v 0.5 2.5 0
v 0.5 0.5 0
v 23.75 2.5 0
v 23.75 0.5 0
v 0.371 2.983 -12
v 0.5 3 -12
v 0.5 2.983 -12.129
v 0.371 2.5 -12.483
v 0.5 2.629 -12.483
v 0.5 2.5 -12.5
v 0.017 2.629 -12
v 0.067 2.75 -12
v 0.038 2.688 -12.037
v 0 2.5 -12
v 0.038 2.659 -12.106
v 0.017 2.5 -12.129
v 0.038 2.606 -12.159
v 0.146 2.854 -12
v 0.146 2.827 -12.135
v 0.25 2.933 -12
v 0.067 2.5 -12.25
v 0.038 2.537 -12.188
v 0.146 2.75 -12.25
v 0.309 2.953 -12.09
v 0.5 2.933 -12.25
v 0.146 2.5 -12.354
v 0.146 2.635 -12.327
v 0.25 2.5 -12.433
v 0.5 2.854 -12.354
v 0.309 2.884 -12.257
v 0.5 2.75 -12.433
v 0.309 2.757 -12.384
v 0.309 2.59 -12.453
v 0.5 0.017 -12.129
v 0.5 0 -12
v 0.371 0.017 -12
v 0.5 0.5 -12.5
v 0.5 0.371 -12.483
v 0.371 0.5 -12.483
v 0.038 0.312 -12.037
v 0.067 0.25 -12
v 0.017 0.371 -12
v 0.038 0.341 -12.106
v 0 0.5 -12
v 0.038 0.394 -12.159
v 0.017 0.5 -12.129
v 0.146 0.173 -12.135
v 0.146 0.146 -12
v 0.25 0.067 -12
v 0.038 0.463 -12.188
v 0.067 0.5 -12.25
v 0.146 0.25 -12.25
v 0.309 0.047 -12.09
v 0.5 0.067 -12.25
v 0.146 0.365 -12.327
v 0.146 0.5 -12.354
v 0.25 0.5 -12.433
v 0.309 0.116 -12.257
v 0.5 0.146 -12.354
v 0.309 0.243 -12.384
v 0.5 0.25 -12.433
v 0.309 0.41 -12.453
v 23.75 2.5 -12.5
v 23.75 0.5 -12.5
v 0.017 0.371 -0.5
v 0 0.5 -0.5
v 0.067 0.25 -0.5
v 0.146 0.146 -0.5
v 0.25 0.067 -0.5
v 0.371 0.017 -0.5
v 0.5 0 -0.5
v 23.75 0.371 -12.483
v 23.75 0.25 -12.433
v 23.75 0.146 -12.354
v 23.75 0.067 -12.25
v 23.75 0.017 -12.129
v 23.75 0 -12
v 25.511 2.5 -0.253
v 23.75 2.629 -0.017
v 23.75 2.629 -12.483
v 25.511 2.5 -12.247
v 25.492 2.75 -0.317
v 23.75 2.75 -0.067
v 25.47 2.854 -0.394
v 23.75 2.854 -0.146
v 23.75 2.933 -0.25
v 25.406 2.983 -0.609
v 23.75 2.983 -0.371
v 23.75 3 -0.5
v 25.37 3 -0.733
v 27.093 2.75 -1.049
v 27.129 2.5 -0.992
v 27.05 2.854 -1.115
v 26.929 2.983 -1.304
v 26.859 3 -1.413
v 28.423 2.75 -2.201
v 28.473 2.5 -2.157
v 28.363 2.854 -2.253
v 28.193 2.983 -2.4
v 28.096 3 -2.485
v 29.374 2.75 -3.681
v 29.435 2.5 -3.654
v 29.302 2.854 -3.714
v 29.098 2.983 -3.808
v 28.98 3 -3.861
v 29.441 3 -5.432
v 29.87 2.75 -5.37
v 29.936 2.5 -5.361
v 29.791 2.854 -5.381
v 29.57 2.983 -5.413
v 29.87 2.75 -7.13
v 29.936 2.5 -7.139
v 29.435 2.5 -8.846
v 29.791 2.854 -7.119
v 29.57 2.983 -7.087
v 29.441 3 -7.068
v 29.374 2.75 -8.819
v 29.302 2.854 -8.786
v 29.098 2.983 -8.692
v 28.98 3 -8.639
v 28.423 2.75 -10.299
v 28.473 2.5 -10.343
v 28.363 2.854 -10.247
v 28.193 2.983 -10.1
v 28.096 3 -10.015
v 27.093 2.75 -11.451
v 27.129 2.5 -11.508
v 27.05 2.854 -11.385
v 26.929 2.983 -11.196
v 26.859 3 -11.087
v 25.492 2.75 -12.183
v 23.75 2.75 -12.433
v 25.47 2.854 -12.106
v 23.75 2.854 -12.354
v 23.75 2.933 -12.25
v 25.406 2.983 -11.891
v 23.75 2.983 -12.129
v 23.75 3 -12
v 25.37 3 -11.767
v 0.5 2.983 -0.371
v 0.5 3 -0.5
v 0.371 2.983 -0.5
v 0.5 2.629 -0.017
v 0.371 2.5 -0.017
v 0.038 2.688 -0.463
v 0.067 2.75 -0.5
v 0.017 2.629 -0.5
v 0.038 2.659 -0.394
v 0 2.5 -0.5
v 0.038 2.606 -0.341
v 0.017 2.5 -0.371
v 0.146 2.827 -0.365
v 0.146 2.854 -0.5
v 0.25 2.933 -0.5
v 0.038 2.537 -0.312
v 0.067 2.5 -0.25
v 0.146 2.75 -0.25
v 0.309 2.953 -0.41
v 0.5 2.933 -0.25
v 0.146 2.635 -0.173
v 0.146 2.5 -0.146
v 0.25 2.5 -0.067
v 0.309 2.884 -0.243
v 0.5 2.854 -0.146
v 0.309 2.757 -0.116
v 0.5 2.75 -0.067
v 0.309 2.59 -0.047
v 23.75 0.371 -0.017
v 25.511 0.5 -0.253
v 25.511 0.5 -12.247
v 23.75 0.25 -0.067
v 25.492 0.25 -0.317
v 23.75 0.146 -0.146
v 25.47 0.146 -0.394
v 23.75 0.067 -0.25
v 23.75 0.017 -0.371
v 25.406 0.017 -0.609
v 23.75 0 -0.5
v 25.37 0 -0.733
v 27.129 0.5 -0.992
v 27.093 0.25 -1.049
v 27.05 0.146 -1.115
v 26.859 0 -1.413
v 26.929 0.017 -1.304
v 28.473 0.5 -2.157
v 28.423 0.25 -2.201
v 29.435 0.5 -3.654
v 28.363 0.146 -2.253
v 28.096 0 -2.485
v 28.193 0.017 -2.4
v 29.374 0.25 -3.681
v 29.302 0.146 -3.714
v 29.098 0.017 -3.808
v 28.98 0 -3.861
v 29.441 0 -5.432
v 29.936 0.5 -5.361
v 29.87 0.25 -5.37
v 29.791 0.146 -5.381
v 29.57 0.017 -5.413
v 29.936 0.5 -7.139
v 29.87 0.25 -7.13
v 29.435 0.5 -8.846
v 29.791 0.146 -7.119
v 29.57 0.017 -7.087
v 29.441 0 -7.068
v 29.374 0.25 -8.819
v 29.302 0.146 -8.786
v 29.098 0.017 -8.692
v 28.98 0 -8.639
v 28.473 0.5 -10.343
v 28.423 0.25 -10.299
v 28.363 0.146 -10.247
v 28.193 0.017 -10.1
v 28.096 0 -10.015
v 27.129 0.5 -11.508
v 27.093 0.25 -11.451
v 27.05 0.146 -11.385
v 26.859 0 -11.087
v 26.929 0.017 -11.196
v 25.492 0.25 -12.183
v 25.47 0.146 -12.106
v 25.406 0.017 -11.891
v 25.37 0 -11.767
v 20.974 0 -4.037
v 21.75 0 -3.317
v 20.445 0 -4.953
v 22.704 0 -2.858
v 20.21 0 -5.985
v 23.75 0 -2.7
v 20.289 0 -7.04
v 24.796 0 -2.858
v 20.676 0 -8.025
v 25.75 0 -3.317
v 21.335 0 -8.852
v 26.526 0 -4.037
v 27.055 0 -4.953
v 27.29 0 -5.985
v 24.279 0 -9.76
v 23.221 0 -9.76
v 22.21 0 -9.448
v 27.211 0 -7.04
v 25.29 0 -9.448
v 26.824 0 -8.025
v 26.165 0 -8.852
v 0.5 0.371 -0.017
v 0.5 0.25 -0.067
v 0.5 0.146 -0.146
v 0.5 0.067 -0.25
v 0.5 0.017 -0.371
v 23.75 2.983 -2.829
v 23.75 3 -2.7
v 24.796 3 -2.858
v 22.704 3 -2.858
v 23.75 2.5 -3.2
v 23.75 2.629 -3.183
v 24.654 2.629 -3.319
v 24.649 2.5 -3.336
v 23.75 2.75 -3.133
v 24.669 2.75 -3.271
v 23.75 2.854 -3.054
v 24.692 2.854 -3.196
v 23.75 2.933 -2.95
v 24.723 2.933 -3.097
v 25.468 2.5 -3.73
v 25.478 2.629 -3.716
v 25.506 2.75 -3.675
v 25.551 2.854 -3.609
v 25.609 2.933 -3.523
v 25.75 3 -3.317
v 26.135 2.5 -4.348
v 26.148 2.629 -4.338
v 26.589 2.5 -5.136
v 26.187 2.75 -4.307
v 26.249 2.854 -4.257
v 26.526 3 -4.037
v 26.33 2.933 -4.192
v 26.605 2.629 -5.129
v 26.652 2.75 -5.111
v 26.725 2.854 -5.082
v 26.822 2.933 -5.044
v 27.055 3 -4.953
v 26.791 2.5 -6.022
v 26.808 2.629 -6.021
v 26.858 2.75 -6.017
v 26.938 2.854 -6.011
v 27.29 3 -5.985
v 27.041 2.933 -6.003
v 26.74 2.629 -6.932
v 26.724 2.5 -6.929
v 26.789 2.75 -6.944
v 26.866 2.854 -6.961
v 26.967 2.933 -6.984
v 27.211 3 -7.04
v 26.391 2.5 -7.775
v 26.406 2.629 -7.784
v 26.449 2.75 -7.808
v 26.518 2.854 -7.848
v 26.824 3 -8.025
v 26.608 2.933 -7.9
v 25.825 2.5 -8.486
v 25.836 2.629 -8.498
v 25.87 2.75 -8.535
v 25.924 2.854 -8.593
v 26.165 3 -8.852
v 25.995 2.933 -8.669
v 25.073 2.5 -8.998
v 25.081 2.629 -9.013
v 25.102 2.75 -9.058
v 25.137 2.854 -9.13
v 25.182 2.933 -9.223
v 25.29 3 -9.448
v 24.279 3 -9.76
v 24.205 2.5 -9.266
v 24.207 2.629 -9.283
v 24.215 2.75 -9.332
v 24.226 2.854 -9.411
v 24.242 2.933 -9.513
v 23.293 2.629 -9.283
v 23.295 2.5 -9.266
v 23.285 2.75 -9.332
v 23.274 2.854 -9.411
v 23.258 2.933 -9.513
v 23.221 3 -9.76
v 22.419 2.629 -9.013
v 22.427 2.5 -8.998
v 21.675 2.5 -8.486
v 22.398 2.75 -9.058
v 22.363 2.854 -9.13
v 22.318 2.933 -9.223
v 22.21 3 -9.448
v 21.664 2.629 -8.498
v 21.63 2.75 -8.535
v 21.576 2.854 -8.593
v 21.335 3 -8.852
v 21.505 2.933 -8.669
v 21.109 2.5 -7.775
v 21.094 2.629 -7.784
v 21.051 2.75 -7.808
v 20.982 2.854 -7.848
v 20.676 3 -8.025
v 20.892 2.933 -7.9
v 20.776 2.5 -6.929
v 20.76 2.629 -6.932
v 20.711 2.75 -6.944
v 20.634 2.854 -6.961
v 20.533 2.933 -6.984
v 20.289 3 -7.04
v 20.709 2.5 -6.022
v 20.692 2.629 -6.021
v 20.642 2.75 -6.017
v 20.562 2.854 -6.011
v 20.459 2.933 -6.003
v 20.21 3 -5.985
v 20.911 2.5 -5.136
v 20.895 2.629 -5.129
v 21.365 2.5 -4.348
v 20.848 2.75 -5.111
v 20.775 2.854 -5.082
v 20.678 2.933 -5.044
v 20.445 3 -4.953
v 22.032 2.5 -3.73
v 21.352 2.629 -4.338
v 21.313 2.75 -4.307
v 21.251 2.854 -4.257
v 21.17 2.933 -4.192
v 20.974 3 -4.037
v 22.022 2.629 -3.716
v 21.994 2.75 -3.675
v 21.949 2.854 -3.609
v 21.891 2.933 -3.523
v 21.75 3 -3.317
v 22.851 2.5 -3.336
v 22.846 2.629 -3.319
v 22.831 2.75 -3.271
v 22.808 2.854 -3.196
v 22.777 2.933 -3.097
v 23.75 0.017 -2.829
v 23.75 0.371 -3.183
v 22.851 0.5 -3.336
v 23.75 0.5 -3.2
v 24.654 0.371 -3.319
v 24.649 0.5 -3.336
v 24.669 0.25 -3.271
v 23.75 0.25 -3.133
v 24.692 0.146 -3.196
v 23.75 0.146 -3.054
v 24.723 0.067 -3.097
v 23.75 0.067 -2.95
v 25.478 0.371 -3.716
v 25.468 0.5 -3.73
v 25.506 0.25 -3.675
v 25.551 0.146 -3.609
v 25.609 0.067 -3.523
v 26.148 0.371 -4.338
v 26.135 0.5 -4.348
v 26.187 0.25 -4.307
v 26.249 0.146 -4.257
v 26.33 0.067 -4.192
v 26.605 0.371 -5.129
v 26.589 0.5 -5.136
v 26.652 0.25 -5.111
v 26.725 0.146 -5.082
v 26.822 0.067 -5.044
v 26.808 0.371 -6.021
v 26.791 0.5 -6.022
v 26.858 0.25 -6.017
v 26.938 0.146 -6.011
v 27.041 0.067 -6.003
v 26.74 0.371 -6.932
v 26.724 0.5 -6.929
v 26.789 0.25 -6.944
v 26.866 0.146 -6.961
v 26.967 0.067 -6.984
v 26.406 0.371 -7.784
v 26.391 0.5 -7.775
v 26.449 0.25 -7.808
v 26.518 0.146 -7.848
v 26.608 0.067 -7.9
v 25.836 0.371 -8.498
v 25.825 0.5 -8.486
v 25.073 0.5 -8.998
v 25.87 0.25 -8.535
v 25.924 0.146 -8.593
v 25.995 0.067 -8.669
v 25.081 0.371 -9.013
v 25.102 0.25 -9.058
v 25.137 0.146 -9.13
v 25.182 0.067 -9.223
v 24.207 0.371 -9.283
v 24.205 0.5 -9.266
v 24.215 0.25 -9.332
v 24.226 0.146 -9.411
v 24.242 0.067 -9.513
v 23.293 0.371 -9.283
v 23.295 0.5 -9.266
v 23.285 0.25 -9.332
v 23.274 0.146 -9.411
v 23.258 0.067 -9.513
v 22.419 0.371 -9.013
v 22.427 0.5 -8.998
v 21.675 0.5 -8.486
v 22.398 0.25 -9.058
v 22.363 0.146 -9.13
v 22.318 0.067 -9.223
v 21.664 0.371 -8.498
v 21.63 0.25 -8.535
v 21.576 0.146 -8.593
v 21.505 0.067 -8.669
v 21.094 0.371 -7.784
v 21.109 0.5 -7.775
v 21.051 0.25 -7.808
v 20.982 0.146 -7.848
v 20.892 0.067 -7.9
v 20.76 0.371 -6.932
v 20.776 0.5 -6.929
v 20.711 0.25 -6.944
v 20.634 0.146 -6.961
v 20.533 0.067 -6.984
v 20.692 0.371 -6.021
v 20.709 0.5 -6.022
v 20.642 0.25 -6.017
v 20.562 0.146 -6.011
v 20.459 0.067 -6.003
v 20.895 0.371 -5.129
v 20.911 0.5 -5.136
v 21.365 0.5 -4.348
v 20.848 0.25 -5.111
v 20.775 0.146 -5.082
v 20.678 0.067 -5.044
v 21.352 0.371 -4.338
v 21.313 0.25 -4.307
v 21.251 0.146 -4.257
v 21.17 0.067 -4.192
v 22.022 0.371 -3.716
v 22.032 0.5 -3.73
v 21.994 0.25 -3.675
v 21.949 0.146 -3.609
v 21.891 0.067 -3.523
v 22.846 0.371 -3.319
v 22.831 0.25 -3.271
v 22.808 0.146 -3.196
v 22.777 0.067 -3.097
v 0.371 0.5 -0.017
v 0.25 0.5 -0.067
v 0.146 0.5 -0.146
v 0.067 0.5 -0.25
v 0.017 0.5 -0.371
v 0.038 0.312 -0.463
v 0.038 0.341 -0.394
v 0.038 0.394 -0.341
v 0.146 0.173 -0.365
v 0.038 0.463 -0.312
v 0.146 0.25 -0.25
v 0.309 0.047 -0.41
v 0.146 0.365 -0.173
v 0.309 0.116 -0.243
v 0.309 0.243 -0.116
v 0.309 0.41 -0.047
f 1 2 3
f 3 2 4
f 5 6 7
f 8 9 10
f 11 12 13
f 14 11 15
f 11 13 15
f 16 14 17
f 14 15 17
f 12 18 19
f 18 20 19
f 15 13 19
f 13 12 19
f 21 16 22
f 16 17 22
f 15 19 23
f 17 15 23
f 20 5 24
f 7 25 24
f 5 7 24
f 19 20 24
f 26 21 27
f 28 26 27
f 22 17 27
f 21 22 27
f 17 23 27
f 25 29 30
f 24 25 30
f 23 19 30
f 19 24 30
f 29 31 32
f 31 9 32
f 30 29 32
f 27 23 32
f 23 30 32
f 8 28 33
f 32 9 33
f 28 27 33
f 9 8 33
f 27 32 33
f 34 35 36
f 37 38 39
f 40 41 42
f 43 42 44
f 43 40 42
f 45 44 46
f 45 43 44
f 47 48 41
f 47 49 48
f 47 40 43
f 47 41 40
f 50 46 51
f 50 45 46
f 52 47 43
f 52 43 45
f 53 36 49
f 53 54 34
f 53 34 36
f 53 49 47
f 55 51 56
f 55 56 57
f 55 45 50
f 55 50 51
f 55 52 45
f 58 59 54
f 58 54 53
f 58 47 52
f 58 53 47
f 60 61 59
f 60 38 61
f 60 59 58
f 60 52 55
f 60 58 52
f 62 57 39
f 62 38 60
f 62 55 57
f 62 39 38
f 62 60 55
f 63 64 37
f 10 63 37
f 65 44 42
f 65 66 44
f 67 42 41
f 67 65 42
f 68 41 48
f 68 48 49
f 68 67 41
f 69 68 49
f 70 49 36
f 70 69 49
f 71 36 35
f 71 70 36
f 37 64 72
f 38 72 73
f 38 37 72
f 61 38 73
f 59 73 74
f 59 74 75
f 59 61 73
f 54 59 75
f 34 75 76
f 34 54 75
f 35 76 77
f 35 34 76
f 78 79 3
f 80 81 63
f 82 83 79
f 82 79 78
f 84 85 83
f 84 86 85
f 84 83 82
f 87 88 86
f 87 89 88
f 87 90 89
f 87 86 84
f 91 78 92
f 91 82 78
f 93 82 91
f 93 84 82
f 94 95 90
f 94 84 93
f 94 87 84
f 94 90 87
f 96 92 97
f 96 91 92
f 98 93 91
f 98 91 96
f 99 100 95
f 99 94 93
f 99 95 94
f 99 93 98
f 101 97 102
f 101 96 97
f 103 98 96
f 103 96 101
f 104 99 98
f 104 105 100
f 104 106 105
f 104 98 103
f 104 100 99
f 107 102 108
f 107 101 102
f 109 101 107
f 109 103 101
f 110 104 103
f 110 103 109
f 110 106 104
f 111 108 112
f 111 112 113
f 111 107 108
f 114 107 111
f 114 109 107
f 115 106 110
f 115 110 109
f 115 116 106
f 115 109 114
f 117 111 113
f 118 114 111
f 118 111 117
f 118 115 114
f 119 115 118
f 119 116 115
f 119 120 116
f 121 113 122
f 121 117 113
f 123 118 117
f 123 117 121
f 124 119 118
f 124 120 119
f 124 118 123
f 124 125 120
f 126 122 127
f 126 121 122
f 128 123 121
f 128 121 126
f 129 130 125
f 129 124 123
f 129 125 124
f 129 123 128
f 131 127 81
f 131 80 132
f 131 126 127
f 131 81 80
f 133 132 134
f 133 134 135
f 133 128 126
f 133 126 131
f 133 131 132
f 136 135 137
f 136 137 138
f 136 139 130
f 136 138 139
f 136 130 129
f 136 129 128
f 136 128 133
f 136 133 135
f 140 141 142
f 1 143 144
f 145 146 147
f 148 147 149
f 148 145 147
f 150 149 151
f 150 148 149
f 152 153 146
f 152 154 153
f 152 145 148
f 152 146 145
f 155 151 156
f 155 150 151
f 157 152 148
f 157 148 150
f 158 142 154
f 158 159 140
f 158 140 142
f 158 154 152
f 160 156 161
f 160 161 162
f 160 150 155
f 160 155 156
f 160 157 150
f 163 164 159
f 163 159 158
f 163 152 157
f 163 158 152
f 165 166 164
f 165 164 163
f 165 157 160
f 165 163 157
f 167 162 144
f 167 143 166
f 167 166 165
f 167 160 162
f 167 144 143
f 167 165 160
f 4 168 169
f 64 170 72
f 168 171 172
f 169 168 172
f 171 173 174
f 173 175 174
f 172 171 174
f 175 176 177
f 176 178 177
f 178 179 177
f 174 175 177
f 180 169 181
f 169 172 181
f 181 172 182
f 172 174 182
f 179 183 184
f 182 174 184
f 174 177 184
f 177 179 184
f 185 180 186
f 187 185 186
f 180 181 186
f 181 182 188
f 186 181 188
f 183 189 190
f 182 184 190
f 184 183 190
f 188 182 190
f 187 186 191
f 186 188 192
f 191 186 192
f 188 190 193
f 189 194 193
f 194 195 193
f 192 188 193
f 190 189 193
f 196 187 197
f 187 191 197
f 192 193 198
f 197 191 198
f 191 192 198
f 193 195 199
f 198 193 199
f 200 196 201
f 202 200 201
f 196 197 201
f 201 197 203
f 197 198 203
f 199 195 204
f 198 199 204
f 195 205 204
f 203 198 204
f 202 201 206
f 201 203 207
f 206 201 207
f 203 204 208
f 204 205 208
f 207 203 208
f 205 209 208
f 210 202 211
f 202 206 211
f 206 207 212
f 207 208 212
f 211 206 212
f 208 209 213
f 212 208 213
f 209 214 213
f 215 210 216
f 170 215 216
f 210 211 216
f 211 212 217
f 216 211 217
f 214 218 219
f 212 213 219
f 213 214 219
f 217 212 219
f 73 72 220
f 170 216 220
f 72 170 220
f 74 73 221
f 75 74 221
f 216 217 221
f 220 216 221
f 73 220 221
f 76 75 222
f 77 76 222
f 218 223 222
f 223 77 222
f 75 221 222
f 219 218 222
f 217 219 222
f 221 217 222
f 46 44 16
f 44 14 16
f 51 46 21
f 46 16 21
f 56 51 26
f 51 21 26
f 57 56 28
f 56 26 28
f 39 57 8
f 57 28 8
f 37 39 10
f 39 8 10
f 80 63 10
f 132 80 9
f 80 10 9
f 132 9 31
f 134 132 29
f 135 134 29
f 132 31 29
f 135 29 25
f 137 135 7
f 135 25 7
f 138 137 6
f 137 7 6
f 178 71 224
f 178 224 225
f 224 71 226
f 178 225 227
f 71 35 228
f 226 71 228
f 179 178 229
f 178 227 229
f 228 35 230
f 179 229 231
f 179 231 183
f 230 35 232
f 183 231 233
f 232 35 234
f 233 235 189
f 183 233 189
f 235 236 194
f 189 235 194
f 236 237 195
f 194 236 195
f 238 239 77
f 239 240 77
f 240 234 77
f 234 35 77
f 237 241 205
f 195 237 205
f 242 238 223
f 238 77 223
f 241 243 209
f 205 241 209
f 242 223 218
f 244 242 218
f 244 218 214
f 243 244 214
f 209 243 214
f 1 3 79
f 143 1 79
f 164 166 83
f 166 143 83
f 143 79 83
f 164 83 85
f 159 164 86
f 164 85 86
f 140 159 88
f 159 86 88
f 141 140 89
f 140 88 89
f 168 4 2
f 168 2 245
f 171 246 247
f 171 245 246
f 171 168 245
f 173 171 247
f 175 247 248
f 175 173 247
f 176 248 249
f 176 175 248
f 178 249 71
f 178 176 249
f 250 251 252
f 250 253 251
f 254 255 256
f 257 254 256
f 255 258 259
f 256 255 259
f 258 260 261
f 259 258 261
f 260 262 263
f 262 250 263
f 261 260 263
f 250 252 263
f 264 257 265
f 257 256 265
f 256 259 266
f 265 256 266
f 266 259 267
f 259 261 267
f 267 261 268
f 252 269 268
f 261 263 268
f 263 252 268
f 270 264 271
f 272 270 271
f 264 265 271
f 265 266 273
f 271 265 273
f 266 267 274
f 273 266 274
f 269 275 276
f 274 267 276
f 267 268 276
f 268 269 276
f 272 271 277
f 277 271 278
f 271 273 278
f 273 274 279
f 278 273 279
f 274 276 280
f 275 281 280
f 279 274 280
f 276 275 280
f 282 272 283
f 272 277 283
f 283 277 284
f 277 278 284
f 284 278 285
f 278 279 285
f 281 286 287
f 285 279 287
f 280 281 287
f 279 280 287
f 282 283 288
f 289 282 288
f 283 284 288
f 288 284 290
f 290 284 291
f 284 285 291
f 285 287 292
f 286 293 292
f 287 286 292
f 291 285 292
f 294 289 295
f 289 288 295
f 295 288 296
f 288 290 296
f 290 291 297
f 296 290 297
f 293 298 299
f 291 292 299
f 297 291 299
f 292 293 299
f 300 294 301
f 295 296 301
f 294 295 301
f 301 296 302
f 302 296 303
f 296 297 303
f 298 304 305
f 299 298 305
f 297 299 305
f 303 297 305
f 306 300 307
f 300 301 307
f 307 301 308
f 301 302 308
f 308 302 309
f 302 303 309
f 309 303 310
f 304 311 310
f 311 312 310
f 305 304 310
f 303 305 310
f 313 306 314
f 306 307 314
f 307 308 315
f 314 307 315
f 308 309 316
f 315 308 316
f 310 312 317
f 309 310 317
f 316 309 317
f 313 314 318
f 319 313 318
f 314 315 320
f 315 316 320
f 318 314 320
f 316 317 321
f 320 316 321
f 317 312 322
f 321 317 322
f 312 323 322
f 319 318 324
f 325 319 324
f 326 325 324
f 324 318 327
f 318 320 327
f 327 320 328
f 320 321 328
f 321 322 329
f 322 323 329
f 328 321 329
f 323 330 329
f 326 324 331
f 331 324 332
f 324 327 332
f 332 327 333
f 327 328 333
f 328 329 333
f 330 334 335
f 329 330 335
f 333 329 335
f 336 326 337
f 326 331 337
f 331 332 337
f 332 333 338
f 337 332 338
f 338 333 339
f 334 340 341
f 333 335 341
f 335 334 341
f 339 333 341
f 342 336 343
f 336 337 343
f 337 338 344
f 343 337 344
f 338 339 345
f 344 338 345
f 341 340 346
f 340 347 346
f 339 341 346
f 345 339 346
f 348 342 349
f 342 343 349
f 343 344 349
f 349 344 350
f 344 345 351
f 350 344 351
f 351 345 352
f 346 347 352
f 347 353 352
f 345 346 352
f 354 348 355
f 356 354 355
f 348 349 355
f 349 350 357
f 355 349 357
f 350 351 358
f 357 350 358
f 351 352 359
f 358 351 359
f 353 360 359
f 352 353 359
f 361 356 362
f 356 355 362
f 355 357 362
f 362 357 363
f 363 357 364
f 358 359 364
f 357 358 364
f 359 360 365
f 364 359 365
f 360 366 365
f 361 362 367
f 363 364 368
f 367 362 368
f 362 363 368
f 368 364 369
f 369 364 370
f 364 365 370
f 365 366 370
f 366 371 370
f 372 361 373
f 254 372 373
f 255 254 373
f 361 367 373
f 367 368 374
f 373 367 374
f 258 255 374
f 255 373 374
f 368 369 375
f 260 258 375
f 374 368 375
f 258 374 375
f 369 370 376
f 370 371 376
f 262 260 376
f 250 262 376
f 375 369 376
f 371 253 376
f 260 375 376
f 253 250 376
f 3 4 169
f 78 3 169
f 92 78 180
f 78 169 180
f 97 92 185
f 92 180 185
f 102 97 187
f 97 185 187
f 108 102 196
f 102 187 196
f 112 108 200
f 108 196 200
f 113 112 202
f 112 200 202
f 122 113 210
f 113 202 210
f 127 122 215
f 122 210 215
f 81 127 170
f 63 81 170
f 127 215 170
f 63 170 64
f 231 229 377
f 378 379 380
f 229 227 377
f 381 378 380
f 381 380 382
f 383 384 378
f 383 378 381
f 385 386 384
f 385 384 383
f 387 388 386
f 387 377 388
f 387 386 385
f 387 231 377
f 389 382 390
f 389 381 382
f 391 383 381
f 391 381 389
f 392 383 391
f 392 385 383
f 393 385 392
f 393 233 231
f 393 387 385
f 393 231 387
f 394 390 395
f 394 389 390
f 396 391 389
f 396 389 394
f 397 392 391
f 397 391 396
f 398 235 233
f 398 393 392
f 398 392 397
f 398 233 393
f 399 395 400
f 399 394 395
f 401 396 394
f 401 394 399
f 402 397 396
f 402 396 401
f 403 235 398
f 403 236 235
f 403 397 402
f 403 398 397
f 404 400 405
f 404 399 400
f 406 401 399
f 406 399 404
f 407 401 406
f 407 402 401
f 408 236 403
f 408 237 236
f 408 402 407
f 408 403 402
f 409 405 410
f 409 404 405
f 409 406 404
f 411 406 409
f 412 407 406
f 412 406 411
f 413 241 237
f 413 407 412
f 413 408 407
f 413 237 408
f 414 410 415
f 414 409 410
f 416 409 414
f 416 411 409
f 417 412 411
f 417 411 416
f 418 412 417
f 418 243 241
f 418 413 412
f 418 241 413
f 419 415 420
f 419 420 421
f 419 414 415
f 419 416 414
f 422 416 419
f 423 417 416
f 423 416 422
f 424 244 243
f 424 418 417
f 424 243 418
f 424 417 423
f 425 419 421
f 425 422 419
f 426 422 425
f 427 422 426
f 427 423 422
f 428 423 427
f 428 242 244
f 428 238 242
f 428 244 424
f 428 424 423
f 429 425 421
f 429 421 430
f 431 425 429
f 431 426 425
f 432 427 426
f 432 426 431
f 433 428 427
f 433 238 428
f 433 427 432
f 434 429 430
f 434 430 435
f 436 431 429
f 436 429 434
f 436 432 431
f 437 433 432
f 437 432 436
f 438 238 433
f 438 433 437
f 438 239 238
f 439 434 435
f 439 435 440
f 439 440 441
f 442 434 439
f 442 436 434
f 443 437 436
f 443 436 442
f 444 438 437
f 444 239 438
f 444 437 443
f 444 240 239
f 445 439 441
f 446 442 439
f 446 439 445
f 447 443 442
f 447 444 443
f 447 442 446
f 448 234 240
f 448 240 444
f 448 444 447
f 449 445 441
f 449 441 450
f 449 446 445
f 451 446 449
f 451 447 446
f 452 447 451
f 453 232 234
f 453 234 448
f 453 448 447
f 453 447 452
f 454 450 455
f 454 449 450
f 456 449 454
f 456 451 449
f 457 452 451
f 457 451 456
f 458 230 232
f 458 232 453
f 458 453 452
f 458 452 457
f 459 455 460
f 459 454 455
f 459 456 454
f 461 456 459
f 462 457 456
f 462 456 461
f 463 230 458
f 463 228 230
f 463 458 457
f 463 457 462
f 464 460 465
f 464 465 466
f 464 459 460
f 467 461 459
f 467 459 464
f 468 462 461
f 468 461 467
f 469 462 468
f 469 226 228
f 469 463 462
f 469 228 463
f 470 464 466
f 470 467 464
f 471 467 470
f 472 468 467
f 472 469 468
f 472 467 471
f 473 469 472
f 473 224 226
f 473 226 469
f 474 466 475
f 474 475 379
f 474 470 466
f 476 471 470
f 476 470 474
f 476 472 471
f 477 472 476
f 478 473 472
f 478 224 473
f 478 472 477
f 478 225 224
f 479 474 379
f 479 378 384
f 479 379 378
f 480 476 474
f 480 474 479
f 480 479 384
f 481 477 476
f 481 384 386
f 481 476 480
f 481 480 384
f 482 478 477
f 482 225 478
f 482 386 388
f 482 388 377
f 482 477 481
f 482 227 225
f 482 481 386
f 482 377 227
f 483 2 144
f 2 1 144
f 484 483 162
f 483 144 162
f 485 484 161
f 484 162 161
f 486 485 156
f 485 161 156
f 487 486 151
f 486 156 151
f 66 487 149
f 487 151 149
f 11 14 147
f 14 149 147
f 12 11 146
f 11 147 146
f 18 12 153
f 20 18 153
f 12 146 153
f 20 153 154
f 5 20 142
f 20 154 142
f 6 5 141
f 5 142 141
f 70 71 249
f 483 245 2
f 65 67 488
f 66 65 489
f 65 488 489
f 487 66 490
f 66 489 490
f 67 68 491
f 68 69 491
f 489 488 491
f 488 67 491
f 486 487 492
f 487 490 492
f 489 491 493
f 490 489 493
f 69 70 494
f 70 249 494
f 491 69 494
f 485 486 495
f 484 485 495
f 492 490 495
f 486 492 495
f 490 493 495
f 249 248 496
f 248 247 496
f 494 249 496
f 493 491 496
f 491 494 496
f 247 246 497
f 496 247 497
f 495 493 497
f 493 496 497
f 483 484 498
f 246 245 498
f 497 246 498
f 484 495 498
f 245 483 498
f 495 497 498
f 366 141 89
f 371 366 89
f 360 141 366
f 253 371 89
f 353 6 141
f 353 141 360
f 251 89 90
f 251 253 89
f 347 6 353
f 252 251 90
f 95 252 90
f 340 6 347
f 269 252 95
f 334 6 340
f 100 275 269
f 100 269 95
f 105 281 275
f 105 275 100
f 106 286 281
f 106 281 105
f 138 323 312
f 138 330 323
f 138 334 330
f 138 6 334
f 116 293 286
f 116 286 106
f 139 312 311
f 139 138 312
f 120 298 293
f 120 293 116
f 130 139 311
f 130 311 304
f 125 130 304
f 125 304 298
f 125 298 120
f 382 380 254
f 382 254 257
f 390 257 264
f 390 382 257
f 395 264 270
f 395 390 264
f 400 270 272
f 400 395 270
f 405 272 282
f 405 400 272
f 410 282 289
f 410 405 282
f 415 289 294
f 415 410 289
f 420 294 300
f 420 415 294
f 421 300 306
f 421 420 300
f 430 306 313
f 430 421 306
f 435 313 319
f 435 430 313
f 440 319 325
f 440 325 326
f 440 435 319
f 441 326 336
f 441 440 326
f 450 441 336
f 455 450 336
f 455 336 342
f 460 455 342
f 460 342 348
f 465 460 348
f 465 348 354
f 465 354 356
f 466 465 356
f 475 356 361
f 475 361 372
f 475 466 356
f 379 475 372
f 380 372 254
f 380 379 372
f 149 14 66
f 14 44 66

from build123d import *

# Parameters (mm, degrees)
SKETCH_1_R      = 3.05
EXTRUDE_1_DEPTH = 3
FILLET_1_R      = 0.5


with BuildPart() as part:
    # 草图1 → 凸台-拉伸1 (new body)
    with BuildSketch(Plane(origin=(0, 0, 0), x_dir=(1, 0, 0), z_dir=(0, 1, 0))):
        with BuildLine():
            Line((0, 0), (23.75, 0))
            ThreePointArc((23.75, 0), (30, 6.25), (23.75, 12.5))
            Line((23.75, 12.5), (0, 12.5))
            Line((0, 12.5), (0, 0))
        make_face()
        with Locations(Location((23.75, 6.25, 0), (0, 0, 270))):
            Circle(SKETCH_1_R, mode=Mode.SUBTRACT)
    extrude(amount=EXTRUDE_1_DEPTH)

    # 圆角1
    fillet_1_edges = [part.edges().sort_by_distance(p)[0] for p in [
        (23.75, 0, -9.3),
        (23.75, 3, -9.3),
        (30, 3, -6.25),
        (11.875, 3, -12.5),
        (0, 3, -6.25),
        (11.875, 0, -12.5),
        (30, 0, -6.25),
        (11.875, 0, 0),
        (0, 0, -6.25),
        (0, 1.5, -12.5),
        (0, 1.5, 0),
        (11.875, 3, 0),
    ]]
    fillet(fillet_1_edges, radius=FILLET_1_R)


solid = part.part
